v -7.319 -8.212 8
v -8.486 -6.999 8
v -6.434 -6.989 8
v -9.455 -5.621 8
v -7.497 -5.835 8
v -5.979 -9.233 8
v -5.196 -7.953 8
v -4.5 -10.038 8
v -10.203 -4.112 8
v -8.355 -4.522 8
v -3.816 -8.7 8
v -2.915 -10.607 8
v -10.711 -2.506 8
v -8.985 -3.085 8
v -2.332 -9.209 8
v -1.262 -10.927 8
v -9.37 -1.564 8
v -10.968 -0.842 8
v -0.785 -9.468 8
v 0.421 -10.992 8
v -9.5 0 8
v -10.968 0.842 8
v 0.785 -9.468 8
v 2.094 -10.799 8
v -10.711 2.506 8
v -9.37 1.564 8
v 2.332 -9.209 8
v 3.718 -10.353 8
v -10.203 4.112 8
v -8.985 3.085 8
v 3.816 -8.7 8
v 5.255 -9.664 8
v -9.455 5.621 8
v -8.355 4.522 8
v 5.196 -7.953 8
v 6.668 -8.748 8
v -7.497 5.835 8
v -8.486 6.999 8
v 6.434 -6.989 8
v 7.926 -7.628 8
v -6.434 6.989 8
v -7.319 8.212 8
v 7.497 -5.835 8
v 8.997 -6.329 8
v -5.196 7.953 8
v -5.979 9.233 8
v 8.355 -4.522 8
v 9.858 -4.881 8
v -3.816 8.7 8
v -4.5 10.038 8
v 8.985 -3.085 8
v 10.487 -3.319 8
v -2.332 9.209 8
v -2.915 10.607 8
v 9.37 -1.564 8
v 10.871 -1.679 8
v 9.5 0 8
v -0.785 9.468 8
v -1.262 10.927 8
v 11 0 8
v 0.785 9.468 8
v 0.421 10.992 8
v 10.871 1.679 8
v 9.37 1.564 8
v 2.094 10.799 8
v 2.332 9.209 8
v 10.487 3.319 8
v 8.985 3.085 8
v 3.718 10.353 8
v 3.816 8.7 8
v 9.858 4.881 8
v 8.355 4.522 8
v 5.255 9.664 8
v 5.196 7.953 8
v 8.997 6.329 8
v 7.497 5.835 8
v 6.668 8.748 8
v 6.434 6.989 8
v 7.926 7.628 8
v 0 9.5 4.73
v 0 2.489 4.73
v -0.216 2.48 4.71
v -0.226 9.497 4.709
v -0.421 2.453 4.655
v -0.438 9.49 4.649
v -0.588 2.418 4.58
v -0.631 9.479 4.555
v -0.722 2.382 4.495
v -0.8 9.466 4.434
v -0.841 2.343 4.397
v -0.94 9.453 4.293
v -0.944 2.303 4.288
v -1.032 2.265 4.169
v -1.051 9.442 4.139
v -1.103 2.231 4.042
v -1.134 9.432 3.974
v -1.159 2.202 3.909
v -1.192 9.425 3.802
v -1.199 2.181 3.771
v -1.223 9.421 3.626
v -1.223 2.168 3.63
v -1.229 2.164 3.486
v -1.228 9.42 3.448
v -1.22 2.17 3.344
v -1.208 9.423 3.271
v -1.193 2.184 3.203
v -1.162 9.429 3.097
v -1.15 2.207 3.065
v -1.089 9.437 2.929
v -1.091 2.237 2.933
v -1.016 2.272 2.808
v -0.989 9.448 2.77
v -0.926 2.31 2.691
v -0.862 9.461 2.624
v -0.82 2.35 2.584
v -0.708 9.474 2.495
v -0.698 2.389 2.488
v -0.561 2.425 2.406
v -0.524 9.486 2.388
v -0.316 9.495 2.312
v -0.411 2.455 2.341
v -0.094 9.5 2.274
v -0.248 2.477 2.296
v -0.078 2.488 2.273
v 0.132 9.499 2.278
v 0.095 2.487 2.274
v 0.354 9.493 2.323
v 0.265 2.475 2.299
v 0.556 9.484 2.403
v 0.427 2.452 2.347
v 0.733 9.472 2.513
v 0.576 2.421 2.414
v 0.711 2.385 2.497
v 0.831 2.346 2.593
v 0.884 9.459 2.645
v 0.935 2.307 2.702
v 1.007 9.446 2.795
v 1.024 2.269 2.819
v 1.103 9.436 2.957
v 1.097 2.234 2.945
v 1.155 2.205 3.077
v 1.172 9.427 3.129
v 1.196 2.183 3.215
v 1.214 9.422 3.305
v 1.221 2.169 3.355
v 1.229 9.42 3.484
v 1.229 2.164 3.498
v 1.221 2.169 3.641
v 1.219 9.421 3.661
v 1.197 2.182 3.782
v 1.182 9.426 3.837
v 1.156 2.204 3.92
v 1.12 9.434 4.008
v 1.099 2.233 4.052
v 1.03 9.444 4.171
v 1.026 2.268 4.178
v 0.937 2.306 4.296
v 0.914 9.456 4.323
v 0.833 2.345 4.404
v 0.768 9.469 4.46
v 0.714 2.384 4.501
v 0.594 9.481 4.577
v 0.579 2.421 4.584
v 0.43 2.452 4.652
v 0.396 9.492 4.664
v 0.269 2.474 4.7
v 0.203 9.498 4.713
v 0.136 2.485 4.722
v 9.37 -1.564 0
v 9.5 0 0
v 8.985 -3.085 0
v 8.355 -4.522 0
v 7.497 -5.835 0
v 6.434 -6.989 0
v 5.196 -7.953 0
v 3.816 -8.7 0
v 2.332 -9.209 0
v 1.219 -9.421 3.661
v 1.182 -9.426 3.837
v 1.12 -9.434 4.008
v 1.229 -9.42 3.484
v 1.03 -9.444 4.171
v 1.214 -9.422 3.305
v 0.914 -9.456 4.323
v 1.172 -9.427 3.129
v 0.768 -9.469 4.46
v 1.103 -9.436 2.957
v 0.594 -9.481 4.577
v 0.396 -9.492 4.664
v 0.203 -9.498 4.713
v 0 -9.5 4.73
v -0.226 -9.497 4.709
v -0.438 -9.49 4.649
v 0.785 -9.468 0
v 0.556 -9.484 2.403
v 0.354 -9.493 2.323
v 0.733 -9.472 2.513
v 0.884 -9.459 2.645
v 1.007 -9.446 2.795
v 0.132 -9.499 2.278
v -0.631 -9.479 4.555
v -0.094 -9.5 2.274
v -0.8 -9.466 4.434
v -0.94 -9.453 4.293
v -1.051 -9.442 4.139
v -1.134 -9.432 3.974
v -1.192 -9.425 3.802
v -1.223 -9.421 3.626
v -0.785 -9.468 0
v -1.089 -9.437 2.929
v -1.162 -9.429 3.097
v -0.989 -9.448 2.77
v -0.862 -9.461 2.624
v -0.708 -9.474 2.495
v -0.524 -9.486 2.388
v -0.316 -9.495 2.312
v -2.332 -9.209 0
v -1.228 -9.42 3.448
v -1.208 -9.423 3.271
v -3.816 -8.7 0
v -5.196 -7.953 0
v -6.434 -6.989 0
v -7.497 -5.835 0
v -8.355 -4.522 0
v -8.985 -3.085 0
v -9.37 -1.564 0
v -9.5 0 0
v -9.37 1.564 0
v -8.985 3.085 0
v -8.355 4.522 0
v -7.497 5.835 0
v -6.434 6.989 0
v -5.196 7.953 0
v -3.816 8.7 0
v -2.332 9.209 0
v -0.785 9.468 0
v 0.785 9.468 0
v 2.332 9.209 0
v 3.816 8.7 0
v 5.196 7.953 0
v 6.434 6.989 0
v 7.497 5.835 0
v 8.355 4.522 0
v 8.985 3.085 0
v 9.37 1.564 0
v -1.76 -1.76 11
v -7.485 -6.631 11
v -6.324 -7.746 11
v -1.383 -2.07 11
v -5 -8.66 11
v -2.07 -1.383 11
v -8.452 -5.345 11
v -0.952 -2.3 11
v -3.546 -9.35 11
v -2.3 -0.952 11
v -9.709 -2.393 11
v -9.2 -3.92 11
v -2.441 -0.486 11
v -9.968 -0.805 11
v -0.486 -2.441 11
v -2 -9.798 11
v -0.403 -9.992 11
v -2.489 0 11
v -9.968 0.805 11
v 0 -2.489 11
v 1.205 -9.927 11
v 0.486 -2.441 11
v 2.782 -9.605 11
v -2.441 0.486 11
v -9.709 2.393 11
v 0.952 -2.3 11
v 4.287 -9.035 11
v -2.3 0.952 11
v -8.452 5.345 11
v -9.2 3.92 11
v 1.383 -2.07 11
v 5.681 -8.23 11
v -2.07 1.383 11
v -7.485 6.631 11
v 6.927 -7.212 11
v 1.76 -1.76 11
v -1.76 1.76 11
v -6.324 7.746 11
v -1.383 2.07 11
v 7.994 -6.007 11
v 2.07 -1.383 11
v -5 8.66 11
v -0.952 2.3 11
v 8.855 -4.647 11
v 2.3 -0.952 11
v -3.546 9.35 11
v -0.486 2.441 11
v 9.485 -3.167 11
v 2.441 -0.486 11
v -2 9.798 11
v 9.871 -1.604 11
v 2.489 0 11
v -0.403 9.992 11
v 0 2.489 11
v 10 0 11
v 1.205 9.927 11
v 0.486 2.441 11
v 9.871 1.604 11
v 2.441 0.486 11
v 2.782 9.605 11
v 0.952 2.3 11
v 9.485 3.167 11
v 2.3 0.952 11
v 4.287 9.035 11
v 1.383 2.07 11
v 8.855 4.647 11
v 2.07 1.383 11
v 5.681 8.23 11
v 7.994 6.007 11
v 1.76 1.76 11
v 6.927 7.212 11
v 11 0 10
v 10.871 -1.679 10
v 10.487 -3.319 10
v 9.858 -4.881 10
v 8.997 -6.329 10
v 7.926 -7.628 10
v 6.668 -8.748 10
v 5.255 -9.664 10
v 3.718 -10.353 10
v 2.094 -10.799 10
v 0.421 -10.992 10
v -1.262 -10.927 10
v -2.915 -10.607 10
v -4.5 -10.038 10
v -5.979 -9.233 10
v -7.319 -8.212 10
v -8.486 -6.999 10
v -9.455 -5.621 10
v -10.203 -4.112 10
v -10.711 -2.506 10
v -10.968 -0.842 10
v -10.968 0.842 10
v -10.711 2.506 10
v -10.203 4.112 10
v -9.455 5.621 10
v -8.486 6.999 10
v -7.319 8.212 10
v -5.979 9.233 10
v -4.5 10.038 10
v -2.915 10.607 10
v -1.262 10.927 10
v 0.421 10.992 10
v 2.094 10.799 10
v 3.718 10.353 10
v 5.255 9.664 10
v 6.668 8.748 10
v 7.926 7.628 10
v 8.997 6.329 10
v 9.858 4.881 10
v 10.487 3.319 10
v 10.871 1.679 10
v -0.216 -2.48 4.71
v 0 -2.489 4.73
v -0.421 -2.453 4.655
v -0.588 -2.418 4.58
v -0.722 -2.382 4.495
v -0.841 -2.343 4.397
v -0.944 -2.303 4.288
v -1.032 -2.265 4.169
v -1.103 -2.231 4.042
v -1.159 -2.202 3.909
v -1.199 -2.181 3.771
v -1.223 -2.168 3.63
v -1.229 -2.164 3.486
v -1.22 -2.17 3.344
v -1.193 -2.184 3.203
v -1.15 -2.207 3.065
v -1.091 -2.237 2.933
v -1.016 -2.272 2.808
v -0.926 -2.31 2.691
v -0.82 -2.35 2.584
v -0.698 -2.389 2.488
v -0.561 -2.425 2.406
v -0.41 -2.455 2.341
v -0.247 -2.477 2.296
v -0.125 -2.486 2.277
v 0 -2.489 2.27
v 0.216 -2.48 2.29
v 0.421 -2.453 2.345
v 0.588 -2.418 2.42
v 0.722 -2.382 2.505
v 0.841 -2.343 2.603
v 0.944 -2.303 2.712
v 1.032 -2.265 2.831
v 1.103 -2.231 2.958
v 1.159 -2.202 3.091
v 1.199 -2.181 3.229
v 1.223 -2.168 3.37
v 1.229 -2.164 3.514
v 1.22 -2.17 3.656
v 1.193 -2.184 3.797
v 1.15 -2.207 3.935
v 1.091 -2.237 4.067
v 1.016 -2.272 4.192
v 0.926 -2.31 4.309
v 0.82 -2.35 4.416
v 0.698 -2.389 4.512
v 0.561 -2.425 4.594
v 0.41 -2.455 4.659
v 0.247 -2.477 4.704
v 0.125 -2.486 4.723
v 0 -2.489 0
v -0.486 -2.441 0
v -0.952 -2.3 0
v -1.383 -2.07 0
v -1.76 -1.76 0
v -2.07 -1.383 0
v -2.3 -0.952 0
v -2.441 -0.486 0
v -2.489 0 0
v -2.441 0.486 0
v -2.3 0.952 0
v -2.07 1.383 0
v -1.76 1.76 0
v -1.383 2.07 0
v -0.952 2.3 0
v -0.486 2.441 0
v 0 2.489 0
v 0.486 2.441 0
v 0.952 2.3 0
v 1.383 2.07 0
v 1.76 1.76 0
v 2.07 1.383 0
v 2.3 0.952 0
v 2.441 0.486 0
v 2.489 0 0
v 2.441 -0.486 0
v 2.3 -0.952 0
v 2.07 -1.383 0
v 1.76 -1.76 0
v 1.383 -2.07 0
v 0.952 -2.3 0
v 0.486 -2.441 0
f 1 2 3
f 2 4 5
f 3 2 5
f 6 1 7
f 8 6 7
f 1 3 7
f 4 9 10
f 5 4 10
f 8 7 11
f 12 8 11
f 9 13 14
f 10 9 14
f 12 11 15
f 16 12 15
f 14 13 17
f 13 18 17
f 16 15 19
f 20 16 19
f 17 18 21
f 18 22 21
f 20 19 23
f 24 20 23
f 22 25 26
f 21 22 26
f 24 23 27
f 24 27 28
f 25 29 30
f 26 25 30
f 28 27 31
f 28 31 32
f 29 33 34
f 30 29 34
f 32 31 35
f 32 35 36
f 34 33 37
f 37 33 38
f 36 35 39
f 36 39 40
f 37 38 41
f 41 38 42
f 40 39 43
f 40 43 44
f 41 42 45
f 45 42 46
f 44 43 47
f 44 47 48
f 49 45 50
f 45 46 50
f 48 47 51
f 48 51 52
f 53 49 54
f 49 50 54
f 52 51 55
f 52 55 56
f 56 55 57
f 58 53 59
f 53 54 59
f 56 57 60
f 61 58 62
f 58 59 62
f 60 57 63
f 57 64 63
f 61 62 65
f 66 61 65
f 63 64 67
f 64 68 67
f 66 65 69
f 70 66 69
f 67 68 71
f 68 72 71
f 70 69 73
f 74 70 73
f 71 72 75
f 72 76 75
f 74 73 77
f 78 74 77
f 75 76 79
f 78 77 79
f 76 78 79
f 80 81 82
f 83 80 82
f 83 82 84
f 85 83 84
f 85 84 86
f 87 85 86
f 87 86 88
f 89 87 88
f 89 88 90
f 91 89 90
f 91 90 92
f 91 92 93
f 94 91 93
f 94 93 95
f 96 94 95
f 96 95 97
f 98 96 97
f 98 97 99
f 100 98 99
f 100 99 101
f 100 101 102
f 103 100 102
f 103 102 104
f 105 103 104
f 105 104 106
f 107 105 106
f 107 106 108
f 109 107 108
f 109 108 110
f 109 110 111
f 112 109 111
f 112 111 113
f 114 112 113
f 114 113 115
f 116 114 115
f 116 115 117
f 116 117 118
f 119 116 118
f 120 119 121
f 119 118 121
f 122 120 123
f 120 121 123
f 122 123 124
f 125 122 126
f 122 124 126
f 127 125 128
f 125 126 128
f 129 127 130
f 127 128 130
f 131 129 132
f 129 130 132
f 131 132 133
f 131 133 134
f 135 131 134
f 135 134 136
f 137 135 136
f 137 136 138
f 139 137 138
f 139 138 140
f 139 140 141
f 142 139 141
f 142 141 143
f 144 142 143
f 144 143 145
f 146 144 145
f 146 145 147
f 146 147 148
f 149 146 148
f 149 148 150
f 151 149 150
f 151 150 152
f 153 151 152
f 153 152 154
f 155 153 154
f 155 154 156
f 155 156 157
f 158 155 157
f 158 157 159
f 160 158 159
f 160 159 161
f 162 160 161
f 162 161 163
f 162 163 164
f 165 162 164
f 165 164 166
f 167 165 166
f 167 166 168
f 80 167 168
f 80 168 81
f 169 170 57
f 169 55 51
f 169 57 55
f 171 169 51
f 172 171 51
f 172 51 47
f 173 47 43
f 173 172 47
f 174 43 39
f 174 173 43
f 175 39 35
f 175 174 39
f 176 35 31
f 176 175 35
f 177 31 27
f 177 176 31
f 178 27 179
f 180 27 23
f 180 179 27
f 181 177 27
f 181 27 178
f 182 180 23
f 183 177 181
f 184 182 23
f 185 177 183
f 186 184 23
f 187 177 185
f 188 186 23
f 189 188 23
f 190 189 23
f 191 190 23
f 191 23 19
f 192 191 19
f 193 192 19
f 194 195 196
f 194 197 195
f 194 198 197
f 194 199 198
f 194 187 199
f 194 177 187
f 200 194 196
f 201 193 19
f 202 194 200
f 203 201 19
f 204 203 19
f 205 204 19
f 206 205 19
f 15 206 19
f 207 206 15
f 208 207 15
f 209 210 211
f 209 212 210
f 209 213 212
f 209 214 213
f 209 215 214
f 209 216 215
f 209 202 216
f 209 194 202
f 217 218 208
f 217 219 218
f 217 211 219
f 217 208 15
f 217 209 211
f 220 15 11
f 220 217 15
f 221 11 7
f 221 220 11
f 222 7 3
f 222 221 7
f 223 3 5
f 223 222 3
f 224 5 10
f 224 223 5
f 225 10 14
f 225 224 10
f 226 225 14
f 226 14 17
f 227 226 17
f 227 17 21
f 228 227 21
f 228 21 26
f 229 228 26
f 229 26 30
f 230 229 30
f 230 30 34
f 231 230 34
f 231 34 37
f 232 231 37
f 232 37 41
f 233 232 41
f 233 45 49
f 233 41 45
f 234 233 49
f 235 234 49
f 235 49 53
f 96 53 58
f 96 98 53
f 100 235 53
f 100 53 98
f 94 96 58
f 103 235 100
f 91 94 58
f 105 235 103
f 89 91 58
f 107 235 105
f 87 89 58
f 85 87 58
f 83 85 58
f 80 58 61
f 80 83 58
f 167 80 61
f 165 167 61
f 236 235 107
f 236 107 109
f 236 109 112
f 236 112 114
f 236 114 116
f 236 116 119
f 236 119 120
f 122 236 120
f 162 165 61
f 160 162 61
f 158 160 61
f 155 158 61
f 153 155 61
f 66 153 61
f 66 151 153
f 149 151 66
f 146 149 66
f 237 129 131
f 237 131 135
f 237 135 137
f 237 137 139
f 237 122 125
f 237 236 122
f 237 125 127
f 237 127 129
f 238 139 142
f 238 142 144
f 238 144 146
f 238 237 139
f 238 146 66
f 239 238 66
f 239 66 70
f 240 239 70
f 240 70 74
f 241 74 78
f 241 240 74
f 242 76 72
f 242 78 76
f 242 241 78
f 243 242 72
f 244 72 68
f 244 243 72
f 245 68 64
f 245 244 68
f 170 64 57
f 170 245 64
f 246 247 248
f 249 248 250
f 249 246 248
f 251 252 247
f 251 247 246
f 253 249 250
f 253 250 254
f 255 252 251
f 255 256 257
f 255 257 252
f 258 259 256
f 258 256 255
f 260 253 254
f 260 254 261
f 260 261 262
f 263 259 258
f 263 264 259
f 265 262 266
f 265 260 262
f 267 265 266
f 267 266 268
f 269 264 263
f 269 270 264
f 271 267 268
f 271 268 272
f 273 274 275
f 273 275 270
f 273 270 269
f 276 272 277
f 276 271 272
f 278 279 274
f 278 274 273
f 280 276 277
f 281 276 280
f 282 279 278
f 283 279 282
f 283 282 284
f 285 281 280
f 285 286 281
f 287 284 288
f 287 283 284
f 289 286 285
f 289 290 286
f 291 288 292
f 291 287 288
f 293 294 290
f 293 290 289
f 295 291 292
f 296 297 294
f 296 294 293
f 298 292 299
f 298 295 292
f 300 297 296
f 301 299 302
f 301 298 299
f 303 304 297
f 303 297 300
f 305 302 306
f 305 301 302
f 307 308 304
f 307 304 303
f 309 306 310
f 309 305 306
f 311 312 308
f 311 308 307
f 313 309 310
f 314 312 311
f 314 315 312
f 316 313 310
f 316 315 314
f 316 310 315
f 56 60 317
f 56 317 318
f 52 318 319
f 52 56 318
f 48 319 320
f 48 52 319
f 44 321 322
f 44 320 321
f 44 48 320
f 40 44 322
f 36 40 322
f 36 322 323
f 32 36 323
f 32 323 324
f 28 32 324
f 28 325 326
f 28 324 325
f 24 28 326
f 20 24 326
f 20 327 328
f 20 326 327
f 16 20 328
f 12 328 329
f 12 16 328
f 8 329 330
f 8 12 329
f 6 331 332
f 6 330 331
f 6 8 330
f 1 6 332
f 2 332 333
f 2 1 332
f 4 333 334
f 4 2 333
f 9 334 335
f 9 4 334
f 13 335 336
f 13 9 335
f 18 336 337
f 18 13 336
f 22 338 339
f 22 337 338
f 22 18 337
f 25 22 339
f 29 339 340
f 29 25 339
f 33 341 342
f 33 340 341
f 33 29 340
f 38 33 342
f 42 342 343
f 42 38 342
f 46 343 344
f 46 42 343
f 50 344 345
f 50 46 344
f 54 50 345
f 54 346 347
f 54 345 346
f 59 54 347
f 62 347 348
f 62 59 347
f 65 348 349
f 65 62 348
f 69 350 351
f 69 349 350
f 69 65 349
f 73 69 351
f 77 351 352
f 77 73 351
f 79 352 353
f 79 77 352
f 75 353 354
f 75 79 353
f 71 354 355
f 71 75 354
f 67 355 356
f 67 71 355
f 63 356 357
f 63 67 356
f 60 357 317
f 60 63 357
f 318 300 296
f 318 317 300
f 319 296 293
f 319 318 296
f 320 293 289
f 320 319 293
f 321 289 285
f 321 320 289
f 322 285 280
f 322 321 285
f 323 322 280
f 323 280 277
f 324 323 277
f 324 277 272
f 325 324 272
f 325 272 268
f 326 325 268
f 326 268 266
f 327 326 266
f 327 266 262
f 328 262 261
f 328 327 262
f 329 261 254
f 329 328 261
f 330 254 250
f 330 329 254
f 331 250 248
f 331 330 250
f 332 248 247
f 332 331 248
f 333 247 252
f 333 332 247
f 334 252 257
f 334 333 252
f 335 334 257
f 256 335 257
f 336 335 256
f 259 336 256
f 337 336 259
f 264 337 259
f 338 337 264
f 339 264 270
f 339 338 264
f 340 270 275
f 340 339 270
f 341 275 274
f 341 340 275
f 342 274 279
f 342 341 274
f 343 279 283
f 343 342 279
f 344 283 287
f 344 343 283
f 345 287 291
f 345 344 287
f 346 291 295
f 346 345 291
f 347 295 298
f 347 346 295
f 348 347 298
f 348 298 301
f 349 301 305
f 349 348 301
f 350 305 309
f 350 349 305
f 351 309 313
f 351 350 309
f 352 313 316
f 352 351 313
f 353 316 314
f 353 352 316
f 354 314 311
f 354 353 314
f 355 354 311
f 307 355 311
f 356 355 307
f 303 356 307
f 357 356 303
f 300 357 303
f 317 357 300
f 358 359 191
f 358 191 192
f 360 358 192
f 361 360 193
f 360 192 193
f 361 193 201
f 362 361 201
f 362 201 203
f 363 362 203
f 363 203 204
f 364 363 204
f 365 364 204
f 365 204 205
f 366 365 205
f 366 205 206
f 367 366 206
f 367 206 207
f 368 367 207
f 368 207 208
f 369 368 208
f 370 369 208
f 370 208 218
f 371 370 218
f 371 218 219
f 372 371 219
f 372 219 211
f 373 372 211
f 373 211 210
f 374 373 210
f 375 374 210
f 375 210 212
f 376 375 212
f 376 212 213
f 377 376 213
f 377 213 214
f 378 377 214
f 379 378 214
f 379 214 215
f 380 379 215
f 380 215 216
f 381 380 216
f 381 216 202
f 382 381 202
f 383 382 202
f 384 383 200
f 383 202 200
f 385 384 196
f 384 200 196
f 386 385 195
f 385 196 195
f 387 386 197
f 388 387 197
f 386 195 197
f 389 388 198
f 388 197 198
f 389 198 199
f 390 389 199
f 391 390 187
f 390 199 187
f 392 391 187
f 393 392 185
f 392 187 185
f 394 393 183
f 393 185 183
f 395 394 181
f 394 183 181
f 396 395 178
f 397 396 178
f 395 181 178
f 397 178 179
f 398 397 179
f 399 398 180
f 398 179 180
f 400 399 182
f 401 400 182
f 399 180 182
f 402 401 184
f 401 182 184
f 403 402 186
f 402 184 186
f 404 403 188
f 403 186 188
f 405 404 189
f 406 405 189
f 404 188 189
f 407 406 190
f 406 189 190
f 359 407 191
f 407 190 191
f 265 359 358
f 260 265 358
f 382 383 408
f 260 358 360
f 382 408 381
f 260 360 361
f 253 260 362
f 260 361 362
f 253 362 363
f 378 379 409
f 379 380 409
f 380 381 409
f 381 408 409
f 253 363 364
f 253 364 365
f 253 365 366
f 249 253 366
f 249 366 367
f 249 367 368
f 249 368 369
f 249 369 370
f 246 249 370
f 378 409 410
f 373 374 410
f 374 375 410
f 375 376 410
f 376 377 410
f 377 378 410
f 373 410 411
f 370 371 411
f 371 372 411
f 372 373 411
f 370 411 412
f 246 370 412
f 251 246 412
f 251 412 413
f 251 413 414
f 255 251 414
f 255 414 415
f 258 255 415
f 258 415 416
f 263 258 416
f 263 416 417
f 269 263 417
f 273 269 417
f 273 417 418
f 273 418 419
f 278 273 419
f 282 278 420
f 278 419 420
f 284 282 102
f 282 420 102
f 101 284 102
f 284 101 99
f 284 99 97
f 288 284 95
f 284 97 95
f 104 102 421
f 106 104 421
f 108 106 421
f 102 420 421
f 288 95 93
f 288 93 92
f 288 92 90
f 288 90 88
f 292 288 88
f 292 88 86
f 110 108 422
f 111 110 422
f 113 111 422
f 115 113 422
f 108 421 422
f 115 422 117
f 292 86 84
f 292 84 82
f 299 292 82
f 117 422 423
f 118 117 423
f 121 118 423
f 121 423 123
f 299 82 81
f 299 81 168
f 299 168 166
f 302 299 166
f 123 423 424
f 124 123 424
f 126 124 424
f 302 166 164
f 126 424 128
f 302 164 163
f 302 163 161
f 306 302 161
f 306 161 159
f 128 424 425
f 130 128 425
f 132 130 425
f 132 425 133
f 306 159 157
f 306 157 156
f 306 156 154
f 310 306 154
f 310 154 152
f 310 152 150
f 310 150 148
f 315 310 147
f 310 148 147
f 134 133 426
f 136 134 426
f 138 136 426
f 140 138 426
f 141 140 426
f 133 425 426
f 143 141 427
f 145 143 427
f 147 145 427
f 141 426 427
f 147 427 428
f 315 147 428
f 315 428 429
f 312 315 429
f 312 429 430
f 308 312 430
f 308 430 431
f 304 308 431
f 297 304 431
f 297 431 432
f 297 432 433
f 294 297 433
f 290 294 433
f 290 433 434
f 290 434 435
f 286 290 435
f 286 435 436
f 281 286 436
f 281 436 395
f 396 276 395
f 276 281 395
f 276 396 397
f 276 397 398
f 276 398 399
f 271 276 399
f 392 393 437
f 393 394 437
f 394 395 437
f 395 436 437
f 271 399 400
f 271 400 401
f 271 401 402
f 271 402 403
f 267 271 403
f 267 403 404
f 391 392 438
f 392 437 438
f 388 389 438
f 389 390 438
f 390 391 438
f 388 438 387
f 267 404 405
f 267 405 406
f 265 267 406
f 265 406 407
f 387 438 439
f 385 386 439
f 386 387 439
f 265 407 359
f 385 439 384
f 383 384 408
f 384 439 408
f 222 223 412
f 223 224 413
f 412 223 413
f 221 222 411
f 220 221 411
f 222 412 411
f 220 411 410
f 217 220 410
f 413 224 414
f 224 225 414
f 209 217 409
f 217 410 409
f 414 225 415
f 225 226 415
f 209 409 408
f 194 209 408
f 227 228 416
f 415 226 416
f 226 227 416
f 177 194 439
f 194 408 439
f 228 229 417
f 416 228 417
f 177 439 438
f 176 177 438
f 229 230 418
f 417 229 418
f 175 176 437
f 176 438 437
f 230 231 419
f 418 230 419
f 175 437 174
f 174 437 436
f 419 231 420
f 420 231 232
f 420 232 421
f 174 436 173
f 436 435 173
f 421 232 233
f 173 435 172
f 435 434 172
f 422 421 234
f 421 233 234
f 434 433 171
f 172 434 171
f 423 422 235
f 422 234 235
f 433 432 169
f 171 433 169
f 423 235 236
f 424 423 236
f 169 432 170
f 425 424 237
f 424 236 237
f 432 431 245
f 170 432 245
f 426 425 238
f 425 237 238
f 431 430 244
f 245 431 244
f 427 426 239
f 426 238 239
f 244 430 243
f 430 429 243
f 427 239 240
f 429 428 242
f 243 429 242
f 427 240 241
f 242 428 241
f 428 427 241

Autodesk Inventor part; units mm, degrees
ref_plane "YZ Plane" through (0, 0, 0) normal (1, 0, 0) x (0, 1, 0)
ref_plane "XY Plane" through (0, 0, 0) normal (0, 0, 1) x (1, 0, 0)
sketch "Mount" plane through (0, 0, 0) normal (0, 0, 1) x (1, 0, 0)
  circle A0 centre (0, 0) radius 9.5
  dimension "d0" = 19
extrude "MountFeature" add sketch "Mount" along normal blind 8
sketch "Base" plane through (0, 0, 8) normal (0, 0, 1) x (1, 0, 0)
  circle A0 centre (0, 0) radius 9.5 construction
  circle A1 centre (0, 0) radius 11
  dimension "d3" = 22
extrude "BaseFeature" add sketch "Base" along normal blind 3
chamfer "BaseChamferFeature" distance 1 angle 45 1 edges at (-11, 0, 11)
sketch "RodEndHole" plane through (0, 0, 11) normal (0, 0, 1) x (1, 0, 0)
  circle A0 centre (0, 0) radius 10 construction
hole "RodEndHoleFeature" at (0, 0, 11) direction (0, 0, -1) diameter 4.978 end through all thread size "1/4-20 UNC" class "2B" standard "ANSI Unified Screw Threads"
ref_plane "MidSidePlane" through (0, 10, 0) normal (0, 1, 0) x (-1, 0, 0)
sketch "MountHole" plane through (0, 10, 0) normal (0, 1, 0) x (-1, 0, 0)
  line L0 (-11, 8) -> (11, 8) construction
  line L1 (-9.5, 0) -> (-9.5, 8) construction
  point P0 (0, 3.5)
  dimension "d18" = 4.5
  dimension "d26" = 22
  dimension "d27" = 11
hole "MountHoleFeature" at (0, 10, 3.5) direction (0, -1, 0) diameter 2.459 end through all thread size "M3x0.5" class "6H" standard "ISO Metric profile"
equation "\"d27\" = 0.5 * d26"
properties part number "BackPair1PistonTopCap"
